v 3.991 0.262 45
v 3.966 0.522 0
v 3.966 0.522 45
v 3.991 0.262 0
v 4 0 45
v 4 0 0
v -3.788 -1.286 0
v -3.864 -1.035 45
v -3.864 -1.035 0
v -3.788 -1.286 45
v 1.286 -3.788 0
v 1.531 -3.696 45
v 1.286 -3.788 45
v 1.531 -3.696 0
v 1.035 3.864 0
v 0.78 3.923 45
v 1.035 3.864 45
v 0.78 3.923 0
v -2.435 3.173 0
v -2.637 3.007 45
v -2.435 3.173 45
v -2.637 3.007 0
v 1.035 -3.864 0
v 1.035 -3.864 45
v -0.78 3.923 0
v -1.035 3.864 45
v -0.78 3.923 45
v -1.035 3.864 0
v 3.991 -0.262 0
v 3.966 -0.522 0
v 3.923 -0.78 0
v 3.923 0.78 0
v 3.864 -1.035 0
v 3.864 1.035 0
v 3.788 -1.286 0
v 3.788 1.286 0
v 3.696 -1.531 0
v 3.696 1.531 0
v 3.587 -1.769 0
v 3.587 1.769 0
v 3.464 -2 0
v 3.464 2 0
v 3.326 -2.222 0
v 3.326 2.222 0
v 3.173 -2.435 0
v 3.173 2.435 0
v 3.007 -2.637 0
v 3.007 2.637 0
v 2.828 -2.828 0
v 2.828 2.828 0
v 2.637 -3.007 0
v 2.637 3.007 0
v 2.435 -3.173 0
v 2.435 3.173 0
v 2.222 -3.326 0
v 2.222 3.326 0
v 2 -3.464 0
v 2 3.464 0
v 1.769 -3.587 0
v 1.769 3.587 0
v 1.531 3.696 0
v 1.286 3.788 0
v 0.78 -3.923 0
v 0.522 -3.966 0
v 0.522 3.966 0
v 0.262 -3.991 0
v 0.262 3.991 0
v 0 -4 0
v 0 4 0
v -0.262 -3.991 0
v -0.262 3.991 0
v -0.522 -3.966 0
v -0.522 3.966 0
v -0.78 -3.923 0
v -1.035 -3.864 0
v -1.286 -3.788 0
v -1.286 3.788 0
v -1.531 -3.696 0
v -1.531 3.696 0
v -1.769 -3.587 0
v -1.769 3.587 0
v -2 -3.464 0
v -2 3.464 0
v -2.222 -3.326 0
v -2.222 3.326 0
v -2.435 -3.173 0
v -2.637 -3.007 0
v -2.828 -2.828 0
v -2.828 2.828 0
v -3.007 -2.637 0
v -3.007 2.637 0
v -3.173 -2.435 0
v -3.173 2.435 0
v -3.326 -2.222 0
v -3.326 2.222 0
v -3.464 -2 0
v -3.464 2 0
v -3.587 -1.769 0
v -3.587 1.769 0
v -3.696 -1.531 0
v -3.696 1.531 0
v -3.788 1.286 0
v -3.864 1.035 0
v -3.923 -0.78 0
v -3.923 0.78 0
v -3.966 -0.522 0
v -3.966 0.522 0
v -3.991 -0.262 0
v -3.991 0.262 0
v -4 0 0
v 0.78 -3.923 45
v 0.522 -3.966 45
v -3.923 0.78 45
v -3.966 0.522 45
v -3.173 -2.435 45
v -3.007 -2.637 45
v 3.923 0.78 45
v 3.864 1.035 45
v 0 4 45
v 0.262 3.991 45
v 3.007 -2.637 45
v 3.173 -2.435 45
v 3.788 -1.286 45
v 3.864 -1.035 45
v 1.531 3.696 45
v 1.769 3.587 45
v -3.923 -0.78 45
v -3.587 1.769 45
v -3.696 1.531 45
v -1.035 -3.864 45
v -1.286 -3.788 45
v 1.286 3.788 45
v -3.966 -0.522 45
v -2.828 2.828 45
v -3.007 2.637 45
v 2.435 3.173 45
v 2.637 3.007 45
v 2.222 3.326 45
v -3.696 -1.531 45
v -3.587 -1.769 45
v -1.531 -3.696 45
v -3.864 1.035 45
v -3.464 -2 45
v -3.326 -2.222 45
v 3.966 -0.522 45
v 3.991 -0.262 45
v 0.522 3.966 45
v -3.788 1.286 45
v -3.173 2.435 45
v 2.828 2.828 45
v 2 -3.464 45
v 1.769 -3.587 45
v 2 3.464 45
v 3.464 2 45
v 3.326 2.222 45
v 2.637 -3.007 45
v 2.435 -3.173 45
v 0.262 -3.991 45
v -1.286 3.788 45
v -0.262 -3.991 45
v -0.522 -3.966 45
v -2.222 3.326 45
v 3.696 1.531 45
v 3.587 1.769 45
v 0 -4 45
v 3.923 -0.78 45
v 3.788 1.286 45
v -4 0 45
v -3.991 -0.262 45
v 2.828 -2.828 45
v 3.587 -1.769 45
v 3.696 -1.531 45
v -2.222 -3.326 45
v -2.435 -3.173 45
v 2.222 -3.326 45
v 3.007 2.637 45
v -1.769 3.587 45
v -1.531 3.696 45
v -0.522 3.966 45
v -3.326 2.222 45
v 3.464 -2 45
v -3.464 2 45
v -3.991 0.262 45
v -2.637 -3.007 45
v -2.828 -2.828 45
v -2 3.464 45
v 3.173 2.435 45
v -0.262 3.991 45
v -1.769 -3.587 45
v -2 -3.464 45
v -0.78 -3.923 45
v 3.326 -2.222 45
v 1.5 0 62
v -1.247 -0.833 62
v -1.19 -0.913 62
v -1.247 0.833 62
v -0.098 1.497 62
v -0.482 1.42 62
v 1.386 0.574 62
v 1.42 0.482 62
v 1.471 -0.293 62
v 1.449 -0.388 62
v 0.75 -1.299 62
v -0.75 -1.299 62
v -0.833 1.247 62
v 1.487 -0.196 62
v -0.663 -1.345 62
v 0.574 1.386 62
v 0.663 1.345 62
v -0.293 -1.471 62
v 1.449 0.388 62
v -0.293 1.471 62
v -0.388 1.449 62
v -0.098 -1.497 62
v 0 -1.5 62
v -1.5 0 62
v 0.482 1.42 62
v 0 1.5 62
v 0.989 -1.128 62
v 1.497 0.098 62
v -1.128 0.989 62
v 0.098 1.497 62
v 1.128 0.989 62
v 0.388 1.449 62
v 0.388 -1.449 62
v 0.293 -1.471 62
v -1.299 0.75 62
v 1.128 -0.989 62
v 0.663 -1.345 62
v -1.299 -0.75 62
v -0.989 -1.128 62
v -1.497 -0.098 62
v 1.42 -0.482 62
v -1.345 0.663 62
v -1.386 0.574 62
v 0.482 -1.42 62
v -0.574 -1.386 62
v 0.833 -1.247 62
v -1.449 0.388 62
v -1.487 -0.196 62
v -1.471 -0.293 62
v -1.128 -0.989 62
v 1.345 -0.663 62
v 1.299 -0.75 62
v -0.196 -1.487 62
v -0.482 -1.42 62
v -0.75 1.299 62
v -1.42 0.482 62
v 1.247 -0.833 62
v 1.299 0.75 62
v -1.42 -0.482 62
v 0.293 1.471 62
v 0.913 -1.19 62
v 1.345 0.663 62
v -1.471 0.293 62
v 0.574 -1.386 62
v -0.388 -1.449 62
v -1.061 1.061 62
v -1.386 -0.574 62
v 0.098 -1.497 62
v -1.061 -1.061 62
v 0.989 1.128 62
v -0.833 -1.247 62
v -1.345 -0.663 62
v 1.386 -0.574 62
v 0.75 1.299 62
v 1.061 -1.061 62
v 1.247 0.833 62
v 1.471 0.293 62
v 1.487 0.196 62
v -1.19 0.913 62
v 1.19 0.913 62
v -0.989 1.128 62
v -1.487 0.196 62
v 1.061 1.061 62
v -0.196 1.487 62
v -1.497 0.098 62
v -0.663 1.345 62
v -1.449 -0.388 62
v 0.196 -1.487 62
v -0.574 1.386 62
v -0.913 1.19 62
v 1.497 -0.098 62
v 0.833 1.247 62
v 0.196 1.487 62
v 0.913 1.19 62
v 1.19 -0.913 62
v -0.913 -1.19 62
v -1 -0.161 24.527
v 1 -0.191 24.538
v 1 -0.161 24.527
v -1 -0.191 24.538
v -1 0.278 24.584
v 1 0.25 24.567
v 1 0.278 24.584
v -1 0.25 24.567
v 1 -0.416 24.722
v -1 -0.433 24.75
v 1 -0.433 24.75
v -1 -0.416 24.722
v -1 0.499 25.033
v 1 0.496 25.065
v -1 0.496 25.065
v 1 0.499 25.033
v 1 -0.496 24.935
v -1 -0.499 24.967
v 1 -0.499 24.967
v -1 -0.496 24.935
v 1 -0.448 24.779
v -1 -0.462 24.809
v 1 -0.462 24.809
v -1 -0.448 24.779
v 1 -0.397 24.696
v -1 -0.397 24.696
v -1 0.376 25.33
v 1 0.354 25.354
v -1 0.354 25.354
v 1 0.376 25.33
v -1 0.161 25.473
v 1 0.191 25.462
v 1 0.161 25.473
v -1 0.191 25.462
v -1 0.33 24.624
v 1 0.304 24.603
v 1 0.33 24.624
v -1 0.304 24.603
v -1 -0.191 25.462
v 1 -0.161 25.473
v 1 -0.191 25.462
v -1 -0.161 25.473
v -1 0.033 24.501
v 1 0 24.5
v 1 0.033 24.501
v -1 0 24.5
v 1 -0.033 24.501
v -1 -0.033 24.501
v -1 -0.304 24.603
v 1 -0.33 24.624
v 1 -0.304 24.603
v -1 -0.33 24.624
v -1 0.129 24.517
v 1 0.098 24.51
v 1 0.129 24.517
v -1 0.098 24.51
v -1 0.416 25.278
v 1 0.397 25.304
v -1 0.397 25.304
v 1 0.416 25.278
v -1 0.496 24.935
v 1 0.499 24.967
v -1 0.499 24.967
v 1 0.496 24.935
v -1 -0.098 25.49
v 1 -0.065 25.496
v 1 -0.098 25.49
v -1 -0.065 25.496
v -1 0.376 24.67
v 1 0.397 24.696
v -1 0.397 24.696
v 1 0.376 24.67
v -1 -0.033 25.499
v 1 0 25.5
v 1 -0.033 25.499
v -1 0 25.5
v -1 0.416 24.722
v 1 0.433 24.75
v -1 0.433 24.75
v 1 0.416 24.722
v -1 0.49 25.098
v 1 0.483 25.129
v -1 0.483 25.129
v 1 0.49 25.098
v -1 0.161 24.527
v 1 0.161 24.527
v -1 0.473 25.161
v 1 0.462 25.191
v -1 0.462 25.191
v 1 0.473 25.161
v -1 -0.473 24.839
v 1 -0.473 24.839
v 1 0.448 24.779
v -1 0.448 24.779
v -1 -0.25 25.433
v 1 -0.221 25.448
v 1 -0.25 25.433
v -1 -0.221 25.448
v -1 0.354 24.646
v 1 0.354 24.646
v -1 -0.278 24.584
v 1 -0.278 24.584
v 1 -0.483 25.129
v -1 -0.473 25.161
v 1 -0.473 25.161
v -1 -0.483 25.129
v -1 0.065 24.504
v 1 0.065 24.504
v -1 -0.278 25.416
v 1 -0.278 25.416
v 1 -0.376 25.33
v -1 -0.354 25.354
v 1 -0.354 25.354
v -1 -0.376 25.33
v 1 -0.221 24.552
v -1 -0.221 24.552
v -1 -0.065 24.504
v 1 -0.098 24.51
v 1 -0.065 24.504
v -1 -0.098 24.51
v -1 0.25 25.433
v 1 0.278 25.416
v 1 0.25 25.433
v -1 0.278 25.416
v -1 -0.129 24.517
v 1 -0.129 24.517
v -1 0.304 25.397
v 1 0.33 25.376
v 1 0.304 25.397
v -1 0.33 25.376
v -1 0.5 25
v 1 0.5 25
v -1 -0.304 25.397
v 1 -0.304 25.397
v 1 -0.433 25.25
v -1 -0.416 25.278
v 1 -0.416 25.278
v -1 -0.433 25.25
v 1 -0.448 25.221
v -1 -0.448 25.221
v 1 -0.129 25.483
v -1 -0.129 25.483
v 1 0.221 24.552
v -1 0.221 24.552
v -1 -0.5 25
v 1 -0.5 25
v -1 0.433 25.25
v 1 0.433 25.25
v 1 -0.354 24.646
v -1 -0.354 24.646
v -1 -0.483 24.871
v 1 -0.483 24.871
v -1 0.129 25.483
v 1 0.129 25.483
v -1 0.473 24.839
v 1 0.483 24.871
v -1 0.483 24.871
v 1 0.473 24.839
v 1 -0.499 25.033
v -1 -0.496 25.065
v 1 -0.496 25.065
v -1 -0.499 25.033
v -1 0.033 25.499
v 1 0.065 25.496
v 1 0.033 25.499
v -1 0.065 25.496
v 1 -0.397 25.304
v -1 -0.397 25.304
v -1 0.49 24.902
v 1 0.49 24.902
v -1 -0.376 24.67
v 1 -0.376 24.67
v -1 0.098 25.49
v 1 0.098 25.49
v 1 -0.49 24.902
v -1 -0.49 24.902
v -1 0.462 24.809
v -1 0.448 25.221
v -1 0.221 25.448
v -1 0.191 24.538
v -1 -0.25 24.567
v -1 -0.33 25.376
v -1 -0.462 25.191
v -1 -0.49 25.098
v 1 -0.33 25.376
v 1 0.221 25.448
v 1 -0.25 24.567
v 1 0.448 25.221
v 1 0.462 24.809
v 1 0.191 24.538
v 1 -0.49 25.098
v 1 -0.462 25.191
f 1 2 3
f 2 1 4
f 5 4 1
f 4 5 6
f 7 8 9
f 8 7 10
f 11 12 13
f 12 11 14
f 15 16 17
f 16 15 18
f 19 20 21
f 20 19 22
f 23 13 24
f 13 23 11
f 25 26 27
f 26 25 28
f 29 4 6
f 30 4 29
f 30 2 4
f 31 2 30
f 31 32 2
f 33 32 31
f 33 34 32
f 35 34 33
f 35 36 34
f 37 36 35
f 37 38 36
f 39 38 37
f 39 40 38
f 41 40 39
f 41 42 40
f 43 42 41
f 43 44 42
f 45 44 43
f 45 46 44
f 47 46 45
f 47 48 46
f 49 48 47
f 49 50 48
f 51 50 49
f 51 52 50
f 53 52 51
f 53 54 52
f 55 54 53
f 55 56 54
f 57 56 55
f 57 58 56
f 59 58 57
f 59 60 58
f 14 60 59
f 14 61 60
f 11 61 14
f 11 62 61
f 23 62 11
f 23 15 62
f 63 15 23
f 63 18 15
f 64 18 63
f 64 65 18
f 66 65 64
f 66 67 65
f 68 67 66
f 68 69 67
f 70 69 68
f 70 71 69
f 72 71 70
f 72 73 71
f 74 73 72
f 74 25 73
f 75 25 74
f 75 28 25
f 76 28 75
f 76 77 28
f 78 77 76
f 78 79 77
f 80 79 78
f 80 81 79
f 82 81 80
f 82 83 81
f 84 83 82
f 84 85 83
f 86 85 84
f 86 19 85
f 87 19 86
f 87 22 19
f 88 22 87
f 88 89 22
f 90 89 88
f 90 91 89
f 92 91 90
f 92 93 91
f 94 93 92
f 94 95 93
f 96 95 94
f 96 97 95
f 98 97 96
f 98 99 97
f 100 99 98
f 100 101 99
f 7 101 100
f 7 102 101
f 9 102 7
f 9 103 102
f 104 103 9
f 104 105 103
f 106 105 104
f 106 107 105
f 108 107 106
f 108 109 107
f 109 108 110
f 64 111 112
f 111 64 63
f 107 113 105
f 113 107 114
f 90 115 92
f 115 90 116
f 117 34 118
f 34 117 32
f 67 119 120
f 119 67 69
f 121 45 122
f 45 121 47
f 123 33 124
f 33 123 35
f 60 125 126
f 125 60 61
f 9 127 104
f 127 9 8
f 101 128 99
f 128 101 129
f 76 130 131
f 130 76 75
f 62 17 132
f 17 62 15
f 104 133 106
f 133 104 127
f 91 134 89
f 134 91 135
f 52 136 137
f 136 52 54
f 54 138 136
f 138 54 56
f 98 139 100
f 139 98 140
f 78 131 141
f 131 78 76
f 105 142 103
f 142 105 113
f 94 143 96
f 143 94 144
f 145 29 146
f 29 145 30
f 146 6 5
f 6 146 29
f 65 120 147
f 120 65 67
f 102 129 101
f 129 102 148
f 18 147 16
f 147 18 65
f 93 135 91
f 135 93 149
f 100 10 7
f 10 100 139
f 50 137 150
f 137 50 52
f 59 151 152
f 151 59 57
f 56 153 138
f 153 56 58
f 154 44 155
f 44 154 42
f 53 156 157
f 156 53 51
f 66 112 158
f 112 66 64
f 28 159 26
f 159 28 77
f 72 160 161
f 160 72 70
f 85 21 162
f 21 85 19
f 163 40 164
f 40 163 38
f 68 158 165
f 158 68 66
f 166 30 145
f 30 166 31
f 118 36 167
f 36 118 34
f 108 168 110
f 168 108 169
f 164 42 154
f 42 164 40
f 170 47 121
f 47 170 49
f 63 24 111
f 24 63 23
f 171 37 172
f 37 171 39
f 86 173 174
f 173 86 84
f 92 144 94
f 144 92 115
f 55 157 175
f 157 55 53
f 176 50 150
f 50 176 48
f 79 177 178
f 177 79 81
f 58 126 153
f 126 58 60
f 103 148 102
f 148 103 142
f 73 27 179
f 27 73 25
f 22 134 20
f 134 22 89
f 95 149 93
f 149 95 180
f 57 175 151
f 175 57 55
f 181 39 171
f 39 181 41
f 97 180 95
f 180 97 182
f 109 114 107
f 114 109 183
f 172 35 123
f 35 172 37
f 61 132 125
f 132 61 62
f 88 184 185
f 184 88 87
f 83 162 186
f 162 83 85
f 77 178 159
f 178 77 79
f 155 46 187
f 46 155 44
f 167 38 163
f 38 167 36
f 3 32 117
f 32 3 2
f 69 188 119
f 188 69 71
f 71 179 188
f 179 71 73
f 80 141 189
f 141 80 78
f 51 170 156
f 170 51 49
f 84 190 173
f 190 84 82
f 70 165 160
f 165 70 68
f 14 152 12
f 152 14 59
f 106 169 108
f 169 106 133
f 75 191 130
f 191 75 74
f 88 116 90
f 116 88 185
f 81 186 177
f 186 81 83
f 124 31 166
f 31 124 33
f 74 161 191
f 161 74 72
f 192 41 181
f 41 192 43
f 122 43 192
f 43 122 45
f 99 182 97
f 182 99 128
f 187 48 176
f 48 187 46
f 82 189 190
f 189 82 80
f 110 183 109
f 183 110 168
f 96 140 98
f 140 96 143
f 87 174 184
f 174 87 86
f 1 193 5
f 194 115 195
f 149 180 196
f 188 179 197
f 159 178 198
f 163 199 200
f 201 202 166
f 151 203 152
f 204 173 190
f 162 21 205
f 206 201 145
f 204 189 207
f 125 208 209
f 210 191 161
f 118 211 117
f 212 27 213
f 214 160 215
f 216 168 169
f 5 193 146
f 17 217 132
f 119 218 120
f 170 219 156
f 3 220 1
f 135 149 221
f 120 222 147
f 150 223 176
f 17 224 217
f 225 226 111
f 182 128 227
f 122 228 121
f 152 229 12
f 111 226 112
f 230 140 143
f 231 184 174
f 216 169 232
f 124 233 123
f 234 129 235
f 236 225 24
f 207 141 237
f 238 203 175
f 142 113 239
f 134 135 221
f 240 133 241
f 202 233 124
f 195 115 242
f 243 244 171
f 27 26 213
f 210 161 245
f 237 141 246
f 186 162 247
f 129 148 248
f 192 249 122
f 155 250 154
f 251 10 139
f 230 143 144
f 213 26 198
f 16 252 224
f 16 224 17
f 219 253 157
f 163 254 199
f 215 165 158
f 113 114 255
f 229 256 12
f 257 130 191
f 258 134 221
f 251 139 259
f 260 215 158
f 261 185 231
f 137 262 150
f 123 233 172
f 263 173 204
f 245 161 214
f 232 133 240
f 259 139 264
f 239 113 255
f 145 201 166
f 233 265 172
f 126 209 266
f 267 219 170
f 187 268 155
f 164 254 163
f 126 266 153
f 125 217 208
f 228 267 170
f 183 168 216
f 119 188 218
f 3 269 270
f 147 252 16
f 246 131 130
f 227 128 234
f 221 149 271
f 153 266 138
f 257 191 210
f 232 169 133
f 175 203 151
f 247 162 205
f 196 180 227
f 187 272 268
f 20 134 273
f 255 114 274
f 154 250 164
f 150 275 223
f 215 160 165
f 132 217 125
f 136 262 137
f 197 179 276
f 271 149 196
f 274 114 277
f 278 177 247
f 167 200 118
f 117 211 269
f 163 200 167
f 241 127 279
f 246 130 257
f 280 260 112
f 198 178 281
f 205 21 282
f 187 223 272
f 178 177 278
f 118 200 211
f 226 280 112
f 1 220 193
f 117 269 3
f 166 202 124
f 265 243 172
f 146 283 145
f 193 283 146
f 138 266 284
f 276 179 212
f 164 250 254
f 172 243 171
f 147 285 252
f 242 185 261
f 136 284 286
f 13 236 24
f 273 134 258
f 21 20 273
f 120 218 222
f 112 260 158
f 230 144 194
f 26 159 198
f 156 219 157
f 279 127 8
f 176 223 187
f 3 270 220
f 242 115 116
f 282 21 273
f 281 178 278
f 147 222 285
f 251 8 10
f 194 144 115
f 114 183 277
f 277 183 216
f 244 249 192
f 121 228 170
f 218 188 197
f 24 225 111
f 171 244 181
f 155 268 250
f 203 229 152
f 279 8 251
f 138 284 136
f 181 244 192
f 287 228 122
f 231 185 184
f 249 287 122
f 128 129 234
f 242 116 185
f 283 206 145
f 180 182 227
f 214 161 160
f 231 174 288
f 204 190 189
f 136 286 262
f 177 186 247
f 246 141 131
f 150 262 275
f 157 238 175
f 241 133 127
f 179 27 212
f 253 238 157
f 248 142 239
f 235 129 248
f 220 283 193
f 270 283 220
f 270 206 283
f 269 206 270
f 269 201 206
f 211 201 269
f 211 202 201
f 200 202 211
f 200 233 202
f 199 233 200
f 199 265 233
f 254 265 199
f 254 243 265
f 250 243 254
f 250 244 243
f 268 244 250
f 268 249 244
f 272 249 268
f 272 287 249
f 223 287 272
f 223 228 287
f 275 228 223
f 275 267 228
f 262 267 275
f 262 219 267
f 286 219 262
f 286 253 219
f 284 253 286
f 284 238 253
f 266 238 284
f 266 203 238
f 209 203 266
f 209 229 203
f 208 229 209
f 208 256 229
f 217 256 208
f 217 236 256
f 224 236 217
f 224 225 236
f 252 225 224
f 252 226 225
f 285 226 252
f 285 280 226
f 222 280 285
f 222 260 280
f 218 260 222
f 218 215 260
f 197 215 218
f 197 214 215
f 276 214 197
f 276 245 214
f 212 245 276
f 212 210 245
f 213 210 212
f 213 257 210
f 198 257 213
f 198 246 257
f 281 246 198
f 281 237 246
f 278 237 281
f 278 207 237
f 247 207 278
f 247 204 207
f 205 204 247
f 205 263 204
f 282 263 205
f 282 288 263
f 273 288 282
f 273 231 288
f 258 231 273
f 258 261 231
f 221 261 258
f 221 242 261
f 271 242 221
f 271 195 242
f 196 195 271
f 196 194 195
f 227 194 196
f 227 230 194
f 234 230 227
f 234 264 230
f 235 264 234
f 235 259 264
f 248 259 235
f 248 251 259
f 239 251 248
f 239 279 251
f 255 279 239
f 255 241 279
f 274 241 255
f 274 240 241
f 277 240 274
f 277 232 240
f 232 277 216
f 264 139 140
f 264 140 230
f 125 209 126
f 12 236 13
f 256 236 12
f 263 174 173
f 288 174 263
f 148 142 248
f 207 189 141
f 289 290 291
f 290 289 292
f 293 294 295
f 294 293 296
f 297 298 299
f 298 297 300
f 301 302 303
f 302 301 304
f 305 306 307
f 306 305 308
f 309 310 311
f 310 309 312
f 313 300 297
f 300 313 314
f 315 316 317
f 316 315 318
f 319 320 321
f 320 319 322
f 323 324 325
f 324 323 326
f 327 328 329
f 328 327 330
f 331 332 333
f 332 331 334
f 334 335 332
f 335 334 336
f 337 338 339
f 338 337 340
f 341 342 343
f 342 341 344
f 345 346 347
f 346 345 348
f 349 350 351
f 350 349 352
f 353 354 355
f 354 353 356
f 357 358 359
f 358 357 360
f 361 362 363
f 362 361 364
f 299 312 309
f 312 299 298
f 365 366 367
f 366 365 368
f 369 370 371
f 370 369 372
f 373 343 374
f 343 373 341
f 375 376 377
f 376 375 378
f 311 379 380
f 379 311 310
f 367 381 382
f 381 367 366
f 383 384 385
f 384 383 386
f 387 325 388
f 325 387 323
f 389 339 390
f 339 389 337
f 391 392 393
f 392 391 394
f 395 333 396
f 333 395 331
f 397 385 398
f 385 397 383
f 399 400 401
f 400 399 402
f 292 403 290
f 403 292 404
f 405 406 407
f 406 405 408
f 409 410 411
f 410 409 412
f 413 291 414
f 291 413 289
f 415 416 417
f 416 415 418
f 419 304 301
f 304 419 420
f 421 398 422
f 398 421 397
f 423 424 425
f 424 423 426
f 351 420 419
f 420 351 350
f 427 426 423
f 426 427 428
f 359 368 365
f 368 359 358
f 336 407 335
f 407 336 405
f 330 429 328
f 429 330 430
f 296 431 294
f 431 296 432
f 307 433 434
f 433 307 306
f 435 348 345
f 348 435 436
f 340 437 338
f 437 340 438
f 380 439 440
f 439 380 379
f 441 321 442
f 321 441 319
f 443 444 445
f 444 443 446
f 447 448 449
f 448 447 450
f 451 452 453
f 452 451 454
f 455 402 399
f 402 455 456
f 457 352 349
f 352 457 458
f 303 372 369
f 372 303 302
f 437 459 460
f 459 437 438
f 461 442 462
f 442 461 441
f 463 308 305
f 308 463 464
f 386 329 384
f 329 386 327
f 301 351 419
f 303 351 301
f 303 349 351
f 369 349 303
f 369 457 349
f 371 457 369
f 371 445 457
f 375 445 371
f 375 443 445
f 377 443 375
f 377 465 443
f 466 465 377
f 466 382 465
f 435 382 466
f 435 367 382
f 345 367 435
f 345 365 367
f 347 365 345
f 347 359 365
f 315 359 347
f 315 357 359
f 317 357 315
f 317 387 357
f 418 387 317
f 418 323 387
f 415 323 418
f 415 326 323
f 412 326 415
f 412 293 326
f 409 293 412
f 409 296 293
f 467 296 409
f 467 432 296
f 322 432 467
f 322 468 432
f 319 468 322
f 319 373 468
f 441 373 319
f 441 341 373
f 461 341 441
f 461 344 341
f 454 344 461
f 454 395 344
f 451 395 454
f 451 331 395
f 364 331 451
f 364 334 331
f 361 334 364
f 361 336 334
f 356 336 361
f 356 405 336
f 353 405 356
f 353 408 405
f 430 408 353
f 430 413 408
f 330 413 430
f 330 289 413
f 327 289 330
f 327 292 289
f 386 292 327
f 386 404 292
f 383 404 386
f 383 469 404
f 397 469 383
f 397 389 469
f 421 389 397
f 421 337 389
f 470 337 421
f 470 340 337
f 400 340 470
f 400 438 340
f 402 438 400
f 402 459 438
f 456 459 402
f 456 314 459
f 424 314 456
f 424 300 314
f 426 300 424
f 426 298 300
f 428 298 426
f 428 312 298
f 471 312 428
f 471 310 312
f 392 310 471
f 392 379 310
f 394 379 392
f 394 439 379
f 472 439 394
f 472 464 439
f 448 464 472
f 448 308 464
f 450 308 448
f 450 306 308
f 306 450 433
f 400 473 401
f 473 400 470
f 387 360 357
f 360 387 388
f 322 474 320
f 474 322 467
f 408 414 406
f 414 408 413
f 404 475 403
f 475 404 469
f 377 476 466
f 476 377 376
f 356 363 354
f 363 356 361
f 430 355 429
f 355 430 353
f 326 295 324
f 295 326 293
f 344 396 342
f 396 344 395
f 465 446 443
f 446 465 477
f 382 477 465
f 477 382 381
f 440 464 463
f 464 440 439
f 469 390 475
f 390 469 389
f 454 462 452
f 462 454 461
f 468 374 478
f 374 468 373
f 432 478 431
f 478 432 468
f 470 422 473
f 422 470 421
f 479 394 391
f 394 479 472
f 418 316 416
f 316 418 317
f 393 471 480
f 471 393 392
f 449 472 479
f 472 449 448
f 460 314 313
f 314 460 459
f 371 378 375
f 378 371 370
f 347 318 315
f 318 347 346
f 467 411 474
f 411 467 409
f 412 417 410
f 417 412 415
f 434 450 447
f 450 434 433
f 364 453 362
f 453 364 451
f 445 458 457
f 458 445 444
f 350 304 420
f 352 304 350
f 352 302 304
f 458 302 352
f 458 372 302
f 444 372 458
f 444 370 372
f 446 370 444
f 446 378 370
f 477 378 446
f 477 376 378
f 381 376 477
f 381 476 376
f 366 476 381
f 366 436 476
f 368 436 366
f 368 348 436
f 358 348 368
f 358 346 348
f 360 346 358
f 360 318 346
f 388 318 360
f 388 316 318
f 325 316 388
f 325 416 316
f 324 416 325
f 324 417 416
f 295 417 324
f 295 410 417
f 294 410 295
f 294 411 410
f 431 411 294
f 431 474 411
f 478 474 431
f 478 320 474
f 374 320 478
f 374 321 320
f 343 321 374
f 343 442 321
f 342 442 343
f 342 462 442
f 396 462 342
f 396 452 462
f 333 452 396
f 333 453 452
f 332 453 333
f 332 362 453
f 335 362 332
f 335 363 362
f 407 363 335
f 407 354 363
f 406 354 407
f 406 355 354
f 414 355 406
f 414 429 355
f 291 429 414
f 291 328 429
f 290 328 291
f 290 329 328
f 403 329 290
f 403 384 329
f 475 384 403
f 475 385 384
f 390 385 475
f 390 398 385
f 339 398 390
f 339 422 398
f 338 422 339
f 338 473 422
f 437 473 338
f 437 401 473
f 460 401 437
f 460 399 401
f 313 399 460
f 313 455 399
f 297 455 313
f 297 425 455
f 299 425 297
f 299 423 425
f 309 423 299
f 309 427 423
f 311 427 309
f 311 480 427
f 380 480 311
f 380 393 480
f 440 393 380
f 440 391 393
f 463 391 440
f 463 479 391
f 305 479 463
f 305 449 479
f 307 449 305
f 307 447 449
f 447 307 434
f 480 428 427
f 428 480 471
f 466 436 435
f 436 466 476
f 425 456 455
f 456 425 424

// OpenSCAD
// Pestle for grinding tissue inside a 1.5 mL microcentrifuge tube
// Print orientation: standing upright on the bed (z = 0), centred on the origin in X and Y.
// Units: millimetres.

// ---------------- Parameters ----------------
handle_d      = 8;    // handle diameter (also cone base diameter)
handle_h      = 45;   // handle height (z = 0 to z = 45)
cone_d        = 3;    // cone tip diameter (at z = 62)
cone_top_z    = 62;   // z where the cone meets the rounded tip
tip_d         = 3;    // rounded tip diameter (sphere)
tip_z         = 62;   // sphere centre height (z = cone_top_z)

groove_count  = 4;    // number of circumferential grooves on the handle
groove_w      = 2;    // groove width (in Z)
groove_depth  = 1;    // groove depth (in radial direction)
groove_z      = [10, 15, 20, 25]; // groove centre heights

eps           = 0.5;  // overshoot for clean boolean cuts
$fn           = 96;   // curve resolution

// ---------------- Model ----------------
difference() {
    union() {
        // (1) Cylindrical handle: z = 0 to z = 45
        cylinder(d = handle_d, h = handle_h);

        // (2) Tapering cone: diameter 8 at z = 45, down to 3 at z = 62
        translate([0, 0, handle_h])
            cylinder(d1 = handle_d, d2 = cone_d, h = cone_top_z - handle_h);

        // (3) Rounded tip: 3 mm diameter sphere centred at z = 62
        translate([0, 0, tip_z - tip_d / 2])
            sphere(d = tip_d);
    }

    // Grip grooves: circumferential cuts into the handle
    for (g = groove_count - 1) {
        translate([0, 0, groove_z[g]])
            rotate([0, 90, 0])
                cylinder(d = groove_depth, h = groove_w, center = true);
    }
}
